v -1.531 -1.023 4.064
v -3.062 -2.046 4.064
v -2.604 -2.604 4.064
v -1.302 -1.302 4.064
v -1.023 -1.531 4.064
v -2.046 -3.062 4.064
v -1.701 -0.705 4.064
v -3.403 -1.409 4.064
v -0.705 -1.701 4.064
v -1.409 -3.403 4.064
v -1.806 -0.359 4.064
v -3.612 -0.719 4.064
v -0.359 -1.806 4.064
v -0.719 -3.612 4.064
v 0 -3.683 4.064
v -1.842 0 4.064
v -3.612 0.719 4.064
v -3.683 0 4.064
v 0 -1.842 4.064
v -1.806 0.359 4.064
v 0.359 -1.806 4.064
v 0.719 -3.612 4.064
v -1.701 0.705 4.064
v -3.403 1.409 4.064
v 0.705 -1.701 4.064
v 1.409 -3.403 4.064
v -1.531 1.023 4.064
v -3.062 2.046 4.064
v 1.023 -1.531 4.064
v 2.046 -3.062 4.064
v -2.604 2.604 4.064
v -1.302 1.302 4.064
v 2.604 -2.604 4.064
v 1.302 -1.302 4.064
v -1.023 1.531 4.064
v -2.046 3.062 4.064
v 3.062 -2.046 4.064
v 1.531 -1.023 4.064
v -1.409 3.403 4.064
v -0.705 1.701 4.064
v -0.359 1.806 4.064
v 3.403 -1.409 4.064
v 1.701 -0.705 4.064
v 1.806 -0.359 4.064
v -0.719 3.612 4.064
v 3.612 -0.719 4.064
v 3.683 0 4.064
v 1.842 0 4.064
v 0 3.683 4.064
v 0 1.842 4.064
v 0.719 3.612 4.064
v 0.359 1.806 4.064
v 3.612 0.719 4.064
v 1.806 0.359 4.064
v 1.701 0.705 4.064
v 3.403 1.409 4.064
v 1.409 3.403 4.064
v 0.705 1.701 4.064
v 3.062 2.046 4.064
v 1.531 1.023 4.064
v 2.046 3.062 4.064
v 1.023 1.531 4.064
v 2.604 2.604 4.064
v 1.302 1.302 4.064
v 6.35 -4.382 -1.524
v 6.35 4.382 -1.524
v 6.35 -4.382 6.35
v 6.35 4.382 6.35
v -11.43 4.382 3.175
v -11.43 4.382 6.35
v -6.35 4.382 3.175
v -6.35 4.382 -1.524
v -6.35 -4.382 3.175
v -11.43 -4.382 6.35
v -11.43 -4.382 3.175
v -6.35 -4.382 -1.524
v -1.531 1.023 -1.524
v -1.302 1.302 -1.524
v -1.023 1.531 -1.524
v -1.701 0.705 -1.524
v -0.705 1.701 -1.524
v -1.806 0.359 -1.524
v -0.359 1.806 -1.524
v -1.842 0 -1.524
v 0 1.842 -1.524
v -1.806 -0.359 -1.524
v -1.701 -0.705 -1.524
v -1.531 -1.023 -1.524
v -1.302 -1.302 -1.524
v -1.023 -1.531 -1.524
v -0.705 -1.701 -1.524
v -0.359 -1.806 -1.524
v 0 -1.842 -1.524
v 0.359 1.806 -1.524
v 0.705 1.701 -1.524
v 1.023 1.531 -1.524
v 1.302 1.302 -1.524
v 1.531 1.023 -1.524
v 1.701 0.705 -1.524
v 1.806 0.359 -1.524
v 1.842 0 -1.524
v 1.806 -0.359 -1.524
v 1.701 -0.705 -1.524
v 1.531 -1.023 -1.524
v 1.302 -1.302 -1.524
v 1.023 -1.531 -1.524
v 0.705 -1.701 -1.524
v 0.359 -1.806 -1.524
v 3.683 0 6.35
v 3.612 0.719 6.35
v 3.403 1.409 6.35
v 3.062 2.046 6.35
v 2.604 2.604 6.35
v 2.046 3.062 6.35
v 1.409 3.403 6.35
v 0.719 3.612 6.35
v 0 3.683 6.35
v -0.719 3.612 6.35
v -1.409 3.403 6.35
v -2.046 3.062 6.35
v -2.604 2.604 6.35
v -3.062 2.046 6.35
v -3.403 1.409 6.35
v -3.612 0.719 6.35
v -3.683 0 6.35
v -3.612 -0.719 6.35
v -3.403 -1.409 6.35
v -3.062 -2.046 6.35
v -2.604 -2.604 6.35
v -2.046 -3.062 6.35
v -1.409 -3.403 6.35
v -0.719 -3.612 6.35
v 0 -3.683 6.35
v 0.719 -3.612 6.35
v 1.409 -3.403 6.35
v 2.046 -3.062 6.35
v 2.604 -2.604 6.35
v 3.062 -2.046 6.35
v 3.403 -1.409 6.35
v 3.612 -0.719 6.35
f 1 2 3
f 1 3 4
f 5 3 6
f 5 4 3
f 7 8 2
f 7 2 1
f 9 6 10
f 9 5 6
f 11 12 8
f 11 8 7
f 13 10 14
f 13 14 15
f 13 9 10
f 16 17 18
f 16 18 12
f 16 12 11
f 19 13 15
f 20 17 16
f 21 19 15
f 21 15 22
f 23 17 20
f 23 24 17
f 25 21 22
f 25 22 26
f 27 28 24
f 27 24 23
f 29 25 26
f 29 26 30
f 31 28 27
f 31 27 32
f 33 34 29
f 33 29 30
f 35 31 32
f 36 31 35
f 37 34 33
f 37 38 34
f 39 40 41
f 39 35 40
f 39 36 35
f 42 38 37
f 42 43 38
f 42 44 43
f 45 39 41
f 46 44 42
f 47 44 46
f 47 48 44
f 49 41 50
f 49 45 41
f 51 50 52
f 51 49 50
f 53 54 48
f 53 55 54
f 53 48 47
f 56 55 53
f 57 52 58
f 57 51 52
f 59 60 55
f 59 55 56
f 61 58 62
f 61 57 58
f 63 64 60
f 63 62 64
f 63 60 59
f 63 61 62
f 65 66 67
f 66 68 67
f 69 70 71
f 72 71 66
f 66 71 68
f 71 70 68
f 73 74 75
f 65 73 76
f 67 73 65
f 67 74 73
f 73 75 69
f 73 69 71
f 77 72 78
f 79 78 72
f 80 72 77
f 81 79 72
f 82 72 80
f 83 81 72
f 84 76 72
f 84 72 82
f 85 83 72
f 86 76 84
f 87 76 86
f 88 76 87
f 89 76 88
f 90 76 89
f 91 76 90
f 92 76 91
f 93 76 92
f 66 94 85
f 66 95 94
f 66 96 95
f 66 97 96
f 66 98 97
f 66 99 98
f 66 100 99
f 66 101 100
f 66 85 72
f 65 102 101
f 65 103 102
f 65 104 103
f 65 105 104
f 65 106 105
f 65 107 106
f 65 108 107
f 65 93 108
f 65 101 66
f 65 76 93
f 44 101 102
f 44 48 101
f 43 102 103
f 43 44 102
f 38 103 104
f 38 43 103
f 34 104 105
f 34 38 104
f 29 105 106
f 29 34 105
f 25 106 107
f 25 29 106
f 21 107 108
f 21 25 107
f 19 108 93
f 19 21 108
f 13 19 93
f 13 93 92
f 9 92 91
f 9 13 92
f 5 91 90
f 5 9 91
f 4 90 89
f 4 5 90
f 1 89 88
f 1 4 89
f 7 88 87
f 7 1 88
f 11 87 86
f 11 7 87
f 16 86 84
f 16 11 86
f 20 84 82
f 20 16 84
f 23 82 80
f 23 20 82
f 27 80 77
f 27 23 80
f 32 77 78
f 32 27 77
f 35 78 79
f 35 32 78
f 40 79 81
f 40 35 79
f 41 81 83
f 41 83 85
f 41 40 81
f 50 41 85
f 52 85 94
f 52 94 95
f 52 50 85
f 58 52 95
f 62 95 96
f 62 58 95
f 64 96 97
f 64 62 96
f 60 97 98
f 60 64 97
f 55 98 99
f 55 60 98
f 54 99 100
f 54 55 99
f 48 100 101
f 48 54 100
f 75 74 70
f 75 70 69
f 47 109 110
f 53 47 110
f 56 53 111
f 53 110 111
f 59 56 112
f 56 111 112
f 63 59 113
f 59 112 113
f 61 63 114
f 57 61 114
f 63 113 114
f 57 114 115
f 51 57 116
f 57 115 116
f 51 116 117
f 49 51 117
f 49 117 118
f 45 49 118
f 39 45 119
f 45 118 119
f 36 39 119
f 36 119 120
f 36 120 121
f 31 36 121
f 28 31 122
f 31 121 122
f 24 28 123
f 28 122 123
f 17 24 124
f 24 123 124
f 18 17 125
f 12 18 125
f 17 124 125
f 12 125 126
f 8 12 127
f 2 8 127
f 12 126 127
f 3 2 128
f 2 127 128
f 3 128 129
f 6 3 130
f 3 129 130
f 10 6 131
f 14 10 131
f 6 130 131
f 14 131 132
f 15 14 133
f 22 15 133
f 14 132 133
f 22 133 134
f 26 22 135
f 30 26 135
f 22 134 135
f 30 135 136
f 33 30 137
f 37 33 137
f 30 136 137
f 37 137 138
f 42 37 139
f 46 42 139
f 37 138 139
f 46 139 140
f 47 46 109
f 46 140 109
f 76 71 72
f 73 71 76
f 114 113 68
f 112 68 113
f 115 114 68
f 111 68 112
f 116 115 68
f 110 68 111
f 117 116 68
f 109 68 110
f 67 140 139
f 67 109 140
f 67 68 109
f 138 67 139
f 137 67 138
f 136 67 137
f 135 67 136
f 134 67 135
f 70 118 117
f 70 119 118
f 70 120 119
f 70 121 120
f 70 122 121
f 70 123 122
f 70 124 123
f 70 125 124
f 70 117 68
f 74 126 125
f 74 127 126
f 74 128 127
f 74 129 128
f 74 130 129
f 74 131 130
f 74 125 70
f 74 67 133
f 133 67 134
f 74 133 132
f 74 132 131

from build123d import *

# Parameters (mm, degrees)
F0_W     = 12.7
F0_H     = 8.763
F1_DEPTH = 3.175
F3_DEPTH = 8.763
F4_R     = 1.8415
F5_DEPTH = 25.4
F6_R     = 3.683
F6_R_2   = 1.8415
F7_DEPTH = 2.286
F8_W     = 12.7
F8_H     = 8.763
F8_R     = 1.8415
F9_DEPTH = 1.524


with BuildPart() as f1:
    # F0 (on Top) → F1 (new body)
    with BuildSketch(Plane.XY):
        Rectangle(F0_W, F0_H)
    extrude(amount=F1_DEPTH)

    # F2 (on face) → F3 (join)
    with BuildSketch(Plane.XZ.offset(4.3815)):
        Polygon((-6.35, 3.175), (6.35, 3.175), (6.35, 6.35), (-11.43, 6.35), (-11.43, 3.175), align=None)
    extrude(amount=-F3_DEPTH)

    # F4 (on face) → F5 (cut)
    with BuildSketch(Plane.XY.offset(6.35)):
        Circle(F4_R)
    extrude(amount=-F5_DEPTH, mode=Mode.SUBTRACT)

    # F6 (on face) → F7 (cut)
    with BuildSketch(Plane.XY.offset(6.35)):
        Circle(F6_R)
        Circle(F6_R_2, mode=Mode.SUBTRACT)
    extrude(amount=-F7_DEPTH, mode=Mode.SUBTRACT)

    # F8 (on face) → F9 (join)
    with BuildSketch(Plane(origin=(0, 0, 0), x_dir=(1, 0, 0), z_dir=(0, 0, -1))):
        Rectangle(F8_W, F8_H)
        Circle(F8_R, mode=Mode.SUBTRACT)
    extrude(amount=F9_DEPTH)


solid = f1.part
